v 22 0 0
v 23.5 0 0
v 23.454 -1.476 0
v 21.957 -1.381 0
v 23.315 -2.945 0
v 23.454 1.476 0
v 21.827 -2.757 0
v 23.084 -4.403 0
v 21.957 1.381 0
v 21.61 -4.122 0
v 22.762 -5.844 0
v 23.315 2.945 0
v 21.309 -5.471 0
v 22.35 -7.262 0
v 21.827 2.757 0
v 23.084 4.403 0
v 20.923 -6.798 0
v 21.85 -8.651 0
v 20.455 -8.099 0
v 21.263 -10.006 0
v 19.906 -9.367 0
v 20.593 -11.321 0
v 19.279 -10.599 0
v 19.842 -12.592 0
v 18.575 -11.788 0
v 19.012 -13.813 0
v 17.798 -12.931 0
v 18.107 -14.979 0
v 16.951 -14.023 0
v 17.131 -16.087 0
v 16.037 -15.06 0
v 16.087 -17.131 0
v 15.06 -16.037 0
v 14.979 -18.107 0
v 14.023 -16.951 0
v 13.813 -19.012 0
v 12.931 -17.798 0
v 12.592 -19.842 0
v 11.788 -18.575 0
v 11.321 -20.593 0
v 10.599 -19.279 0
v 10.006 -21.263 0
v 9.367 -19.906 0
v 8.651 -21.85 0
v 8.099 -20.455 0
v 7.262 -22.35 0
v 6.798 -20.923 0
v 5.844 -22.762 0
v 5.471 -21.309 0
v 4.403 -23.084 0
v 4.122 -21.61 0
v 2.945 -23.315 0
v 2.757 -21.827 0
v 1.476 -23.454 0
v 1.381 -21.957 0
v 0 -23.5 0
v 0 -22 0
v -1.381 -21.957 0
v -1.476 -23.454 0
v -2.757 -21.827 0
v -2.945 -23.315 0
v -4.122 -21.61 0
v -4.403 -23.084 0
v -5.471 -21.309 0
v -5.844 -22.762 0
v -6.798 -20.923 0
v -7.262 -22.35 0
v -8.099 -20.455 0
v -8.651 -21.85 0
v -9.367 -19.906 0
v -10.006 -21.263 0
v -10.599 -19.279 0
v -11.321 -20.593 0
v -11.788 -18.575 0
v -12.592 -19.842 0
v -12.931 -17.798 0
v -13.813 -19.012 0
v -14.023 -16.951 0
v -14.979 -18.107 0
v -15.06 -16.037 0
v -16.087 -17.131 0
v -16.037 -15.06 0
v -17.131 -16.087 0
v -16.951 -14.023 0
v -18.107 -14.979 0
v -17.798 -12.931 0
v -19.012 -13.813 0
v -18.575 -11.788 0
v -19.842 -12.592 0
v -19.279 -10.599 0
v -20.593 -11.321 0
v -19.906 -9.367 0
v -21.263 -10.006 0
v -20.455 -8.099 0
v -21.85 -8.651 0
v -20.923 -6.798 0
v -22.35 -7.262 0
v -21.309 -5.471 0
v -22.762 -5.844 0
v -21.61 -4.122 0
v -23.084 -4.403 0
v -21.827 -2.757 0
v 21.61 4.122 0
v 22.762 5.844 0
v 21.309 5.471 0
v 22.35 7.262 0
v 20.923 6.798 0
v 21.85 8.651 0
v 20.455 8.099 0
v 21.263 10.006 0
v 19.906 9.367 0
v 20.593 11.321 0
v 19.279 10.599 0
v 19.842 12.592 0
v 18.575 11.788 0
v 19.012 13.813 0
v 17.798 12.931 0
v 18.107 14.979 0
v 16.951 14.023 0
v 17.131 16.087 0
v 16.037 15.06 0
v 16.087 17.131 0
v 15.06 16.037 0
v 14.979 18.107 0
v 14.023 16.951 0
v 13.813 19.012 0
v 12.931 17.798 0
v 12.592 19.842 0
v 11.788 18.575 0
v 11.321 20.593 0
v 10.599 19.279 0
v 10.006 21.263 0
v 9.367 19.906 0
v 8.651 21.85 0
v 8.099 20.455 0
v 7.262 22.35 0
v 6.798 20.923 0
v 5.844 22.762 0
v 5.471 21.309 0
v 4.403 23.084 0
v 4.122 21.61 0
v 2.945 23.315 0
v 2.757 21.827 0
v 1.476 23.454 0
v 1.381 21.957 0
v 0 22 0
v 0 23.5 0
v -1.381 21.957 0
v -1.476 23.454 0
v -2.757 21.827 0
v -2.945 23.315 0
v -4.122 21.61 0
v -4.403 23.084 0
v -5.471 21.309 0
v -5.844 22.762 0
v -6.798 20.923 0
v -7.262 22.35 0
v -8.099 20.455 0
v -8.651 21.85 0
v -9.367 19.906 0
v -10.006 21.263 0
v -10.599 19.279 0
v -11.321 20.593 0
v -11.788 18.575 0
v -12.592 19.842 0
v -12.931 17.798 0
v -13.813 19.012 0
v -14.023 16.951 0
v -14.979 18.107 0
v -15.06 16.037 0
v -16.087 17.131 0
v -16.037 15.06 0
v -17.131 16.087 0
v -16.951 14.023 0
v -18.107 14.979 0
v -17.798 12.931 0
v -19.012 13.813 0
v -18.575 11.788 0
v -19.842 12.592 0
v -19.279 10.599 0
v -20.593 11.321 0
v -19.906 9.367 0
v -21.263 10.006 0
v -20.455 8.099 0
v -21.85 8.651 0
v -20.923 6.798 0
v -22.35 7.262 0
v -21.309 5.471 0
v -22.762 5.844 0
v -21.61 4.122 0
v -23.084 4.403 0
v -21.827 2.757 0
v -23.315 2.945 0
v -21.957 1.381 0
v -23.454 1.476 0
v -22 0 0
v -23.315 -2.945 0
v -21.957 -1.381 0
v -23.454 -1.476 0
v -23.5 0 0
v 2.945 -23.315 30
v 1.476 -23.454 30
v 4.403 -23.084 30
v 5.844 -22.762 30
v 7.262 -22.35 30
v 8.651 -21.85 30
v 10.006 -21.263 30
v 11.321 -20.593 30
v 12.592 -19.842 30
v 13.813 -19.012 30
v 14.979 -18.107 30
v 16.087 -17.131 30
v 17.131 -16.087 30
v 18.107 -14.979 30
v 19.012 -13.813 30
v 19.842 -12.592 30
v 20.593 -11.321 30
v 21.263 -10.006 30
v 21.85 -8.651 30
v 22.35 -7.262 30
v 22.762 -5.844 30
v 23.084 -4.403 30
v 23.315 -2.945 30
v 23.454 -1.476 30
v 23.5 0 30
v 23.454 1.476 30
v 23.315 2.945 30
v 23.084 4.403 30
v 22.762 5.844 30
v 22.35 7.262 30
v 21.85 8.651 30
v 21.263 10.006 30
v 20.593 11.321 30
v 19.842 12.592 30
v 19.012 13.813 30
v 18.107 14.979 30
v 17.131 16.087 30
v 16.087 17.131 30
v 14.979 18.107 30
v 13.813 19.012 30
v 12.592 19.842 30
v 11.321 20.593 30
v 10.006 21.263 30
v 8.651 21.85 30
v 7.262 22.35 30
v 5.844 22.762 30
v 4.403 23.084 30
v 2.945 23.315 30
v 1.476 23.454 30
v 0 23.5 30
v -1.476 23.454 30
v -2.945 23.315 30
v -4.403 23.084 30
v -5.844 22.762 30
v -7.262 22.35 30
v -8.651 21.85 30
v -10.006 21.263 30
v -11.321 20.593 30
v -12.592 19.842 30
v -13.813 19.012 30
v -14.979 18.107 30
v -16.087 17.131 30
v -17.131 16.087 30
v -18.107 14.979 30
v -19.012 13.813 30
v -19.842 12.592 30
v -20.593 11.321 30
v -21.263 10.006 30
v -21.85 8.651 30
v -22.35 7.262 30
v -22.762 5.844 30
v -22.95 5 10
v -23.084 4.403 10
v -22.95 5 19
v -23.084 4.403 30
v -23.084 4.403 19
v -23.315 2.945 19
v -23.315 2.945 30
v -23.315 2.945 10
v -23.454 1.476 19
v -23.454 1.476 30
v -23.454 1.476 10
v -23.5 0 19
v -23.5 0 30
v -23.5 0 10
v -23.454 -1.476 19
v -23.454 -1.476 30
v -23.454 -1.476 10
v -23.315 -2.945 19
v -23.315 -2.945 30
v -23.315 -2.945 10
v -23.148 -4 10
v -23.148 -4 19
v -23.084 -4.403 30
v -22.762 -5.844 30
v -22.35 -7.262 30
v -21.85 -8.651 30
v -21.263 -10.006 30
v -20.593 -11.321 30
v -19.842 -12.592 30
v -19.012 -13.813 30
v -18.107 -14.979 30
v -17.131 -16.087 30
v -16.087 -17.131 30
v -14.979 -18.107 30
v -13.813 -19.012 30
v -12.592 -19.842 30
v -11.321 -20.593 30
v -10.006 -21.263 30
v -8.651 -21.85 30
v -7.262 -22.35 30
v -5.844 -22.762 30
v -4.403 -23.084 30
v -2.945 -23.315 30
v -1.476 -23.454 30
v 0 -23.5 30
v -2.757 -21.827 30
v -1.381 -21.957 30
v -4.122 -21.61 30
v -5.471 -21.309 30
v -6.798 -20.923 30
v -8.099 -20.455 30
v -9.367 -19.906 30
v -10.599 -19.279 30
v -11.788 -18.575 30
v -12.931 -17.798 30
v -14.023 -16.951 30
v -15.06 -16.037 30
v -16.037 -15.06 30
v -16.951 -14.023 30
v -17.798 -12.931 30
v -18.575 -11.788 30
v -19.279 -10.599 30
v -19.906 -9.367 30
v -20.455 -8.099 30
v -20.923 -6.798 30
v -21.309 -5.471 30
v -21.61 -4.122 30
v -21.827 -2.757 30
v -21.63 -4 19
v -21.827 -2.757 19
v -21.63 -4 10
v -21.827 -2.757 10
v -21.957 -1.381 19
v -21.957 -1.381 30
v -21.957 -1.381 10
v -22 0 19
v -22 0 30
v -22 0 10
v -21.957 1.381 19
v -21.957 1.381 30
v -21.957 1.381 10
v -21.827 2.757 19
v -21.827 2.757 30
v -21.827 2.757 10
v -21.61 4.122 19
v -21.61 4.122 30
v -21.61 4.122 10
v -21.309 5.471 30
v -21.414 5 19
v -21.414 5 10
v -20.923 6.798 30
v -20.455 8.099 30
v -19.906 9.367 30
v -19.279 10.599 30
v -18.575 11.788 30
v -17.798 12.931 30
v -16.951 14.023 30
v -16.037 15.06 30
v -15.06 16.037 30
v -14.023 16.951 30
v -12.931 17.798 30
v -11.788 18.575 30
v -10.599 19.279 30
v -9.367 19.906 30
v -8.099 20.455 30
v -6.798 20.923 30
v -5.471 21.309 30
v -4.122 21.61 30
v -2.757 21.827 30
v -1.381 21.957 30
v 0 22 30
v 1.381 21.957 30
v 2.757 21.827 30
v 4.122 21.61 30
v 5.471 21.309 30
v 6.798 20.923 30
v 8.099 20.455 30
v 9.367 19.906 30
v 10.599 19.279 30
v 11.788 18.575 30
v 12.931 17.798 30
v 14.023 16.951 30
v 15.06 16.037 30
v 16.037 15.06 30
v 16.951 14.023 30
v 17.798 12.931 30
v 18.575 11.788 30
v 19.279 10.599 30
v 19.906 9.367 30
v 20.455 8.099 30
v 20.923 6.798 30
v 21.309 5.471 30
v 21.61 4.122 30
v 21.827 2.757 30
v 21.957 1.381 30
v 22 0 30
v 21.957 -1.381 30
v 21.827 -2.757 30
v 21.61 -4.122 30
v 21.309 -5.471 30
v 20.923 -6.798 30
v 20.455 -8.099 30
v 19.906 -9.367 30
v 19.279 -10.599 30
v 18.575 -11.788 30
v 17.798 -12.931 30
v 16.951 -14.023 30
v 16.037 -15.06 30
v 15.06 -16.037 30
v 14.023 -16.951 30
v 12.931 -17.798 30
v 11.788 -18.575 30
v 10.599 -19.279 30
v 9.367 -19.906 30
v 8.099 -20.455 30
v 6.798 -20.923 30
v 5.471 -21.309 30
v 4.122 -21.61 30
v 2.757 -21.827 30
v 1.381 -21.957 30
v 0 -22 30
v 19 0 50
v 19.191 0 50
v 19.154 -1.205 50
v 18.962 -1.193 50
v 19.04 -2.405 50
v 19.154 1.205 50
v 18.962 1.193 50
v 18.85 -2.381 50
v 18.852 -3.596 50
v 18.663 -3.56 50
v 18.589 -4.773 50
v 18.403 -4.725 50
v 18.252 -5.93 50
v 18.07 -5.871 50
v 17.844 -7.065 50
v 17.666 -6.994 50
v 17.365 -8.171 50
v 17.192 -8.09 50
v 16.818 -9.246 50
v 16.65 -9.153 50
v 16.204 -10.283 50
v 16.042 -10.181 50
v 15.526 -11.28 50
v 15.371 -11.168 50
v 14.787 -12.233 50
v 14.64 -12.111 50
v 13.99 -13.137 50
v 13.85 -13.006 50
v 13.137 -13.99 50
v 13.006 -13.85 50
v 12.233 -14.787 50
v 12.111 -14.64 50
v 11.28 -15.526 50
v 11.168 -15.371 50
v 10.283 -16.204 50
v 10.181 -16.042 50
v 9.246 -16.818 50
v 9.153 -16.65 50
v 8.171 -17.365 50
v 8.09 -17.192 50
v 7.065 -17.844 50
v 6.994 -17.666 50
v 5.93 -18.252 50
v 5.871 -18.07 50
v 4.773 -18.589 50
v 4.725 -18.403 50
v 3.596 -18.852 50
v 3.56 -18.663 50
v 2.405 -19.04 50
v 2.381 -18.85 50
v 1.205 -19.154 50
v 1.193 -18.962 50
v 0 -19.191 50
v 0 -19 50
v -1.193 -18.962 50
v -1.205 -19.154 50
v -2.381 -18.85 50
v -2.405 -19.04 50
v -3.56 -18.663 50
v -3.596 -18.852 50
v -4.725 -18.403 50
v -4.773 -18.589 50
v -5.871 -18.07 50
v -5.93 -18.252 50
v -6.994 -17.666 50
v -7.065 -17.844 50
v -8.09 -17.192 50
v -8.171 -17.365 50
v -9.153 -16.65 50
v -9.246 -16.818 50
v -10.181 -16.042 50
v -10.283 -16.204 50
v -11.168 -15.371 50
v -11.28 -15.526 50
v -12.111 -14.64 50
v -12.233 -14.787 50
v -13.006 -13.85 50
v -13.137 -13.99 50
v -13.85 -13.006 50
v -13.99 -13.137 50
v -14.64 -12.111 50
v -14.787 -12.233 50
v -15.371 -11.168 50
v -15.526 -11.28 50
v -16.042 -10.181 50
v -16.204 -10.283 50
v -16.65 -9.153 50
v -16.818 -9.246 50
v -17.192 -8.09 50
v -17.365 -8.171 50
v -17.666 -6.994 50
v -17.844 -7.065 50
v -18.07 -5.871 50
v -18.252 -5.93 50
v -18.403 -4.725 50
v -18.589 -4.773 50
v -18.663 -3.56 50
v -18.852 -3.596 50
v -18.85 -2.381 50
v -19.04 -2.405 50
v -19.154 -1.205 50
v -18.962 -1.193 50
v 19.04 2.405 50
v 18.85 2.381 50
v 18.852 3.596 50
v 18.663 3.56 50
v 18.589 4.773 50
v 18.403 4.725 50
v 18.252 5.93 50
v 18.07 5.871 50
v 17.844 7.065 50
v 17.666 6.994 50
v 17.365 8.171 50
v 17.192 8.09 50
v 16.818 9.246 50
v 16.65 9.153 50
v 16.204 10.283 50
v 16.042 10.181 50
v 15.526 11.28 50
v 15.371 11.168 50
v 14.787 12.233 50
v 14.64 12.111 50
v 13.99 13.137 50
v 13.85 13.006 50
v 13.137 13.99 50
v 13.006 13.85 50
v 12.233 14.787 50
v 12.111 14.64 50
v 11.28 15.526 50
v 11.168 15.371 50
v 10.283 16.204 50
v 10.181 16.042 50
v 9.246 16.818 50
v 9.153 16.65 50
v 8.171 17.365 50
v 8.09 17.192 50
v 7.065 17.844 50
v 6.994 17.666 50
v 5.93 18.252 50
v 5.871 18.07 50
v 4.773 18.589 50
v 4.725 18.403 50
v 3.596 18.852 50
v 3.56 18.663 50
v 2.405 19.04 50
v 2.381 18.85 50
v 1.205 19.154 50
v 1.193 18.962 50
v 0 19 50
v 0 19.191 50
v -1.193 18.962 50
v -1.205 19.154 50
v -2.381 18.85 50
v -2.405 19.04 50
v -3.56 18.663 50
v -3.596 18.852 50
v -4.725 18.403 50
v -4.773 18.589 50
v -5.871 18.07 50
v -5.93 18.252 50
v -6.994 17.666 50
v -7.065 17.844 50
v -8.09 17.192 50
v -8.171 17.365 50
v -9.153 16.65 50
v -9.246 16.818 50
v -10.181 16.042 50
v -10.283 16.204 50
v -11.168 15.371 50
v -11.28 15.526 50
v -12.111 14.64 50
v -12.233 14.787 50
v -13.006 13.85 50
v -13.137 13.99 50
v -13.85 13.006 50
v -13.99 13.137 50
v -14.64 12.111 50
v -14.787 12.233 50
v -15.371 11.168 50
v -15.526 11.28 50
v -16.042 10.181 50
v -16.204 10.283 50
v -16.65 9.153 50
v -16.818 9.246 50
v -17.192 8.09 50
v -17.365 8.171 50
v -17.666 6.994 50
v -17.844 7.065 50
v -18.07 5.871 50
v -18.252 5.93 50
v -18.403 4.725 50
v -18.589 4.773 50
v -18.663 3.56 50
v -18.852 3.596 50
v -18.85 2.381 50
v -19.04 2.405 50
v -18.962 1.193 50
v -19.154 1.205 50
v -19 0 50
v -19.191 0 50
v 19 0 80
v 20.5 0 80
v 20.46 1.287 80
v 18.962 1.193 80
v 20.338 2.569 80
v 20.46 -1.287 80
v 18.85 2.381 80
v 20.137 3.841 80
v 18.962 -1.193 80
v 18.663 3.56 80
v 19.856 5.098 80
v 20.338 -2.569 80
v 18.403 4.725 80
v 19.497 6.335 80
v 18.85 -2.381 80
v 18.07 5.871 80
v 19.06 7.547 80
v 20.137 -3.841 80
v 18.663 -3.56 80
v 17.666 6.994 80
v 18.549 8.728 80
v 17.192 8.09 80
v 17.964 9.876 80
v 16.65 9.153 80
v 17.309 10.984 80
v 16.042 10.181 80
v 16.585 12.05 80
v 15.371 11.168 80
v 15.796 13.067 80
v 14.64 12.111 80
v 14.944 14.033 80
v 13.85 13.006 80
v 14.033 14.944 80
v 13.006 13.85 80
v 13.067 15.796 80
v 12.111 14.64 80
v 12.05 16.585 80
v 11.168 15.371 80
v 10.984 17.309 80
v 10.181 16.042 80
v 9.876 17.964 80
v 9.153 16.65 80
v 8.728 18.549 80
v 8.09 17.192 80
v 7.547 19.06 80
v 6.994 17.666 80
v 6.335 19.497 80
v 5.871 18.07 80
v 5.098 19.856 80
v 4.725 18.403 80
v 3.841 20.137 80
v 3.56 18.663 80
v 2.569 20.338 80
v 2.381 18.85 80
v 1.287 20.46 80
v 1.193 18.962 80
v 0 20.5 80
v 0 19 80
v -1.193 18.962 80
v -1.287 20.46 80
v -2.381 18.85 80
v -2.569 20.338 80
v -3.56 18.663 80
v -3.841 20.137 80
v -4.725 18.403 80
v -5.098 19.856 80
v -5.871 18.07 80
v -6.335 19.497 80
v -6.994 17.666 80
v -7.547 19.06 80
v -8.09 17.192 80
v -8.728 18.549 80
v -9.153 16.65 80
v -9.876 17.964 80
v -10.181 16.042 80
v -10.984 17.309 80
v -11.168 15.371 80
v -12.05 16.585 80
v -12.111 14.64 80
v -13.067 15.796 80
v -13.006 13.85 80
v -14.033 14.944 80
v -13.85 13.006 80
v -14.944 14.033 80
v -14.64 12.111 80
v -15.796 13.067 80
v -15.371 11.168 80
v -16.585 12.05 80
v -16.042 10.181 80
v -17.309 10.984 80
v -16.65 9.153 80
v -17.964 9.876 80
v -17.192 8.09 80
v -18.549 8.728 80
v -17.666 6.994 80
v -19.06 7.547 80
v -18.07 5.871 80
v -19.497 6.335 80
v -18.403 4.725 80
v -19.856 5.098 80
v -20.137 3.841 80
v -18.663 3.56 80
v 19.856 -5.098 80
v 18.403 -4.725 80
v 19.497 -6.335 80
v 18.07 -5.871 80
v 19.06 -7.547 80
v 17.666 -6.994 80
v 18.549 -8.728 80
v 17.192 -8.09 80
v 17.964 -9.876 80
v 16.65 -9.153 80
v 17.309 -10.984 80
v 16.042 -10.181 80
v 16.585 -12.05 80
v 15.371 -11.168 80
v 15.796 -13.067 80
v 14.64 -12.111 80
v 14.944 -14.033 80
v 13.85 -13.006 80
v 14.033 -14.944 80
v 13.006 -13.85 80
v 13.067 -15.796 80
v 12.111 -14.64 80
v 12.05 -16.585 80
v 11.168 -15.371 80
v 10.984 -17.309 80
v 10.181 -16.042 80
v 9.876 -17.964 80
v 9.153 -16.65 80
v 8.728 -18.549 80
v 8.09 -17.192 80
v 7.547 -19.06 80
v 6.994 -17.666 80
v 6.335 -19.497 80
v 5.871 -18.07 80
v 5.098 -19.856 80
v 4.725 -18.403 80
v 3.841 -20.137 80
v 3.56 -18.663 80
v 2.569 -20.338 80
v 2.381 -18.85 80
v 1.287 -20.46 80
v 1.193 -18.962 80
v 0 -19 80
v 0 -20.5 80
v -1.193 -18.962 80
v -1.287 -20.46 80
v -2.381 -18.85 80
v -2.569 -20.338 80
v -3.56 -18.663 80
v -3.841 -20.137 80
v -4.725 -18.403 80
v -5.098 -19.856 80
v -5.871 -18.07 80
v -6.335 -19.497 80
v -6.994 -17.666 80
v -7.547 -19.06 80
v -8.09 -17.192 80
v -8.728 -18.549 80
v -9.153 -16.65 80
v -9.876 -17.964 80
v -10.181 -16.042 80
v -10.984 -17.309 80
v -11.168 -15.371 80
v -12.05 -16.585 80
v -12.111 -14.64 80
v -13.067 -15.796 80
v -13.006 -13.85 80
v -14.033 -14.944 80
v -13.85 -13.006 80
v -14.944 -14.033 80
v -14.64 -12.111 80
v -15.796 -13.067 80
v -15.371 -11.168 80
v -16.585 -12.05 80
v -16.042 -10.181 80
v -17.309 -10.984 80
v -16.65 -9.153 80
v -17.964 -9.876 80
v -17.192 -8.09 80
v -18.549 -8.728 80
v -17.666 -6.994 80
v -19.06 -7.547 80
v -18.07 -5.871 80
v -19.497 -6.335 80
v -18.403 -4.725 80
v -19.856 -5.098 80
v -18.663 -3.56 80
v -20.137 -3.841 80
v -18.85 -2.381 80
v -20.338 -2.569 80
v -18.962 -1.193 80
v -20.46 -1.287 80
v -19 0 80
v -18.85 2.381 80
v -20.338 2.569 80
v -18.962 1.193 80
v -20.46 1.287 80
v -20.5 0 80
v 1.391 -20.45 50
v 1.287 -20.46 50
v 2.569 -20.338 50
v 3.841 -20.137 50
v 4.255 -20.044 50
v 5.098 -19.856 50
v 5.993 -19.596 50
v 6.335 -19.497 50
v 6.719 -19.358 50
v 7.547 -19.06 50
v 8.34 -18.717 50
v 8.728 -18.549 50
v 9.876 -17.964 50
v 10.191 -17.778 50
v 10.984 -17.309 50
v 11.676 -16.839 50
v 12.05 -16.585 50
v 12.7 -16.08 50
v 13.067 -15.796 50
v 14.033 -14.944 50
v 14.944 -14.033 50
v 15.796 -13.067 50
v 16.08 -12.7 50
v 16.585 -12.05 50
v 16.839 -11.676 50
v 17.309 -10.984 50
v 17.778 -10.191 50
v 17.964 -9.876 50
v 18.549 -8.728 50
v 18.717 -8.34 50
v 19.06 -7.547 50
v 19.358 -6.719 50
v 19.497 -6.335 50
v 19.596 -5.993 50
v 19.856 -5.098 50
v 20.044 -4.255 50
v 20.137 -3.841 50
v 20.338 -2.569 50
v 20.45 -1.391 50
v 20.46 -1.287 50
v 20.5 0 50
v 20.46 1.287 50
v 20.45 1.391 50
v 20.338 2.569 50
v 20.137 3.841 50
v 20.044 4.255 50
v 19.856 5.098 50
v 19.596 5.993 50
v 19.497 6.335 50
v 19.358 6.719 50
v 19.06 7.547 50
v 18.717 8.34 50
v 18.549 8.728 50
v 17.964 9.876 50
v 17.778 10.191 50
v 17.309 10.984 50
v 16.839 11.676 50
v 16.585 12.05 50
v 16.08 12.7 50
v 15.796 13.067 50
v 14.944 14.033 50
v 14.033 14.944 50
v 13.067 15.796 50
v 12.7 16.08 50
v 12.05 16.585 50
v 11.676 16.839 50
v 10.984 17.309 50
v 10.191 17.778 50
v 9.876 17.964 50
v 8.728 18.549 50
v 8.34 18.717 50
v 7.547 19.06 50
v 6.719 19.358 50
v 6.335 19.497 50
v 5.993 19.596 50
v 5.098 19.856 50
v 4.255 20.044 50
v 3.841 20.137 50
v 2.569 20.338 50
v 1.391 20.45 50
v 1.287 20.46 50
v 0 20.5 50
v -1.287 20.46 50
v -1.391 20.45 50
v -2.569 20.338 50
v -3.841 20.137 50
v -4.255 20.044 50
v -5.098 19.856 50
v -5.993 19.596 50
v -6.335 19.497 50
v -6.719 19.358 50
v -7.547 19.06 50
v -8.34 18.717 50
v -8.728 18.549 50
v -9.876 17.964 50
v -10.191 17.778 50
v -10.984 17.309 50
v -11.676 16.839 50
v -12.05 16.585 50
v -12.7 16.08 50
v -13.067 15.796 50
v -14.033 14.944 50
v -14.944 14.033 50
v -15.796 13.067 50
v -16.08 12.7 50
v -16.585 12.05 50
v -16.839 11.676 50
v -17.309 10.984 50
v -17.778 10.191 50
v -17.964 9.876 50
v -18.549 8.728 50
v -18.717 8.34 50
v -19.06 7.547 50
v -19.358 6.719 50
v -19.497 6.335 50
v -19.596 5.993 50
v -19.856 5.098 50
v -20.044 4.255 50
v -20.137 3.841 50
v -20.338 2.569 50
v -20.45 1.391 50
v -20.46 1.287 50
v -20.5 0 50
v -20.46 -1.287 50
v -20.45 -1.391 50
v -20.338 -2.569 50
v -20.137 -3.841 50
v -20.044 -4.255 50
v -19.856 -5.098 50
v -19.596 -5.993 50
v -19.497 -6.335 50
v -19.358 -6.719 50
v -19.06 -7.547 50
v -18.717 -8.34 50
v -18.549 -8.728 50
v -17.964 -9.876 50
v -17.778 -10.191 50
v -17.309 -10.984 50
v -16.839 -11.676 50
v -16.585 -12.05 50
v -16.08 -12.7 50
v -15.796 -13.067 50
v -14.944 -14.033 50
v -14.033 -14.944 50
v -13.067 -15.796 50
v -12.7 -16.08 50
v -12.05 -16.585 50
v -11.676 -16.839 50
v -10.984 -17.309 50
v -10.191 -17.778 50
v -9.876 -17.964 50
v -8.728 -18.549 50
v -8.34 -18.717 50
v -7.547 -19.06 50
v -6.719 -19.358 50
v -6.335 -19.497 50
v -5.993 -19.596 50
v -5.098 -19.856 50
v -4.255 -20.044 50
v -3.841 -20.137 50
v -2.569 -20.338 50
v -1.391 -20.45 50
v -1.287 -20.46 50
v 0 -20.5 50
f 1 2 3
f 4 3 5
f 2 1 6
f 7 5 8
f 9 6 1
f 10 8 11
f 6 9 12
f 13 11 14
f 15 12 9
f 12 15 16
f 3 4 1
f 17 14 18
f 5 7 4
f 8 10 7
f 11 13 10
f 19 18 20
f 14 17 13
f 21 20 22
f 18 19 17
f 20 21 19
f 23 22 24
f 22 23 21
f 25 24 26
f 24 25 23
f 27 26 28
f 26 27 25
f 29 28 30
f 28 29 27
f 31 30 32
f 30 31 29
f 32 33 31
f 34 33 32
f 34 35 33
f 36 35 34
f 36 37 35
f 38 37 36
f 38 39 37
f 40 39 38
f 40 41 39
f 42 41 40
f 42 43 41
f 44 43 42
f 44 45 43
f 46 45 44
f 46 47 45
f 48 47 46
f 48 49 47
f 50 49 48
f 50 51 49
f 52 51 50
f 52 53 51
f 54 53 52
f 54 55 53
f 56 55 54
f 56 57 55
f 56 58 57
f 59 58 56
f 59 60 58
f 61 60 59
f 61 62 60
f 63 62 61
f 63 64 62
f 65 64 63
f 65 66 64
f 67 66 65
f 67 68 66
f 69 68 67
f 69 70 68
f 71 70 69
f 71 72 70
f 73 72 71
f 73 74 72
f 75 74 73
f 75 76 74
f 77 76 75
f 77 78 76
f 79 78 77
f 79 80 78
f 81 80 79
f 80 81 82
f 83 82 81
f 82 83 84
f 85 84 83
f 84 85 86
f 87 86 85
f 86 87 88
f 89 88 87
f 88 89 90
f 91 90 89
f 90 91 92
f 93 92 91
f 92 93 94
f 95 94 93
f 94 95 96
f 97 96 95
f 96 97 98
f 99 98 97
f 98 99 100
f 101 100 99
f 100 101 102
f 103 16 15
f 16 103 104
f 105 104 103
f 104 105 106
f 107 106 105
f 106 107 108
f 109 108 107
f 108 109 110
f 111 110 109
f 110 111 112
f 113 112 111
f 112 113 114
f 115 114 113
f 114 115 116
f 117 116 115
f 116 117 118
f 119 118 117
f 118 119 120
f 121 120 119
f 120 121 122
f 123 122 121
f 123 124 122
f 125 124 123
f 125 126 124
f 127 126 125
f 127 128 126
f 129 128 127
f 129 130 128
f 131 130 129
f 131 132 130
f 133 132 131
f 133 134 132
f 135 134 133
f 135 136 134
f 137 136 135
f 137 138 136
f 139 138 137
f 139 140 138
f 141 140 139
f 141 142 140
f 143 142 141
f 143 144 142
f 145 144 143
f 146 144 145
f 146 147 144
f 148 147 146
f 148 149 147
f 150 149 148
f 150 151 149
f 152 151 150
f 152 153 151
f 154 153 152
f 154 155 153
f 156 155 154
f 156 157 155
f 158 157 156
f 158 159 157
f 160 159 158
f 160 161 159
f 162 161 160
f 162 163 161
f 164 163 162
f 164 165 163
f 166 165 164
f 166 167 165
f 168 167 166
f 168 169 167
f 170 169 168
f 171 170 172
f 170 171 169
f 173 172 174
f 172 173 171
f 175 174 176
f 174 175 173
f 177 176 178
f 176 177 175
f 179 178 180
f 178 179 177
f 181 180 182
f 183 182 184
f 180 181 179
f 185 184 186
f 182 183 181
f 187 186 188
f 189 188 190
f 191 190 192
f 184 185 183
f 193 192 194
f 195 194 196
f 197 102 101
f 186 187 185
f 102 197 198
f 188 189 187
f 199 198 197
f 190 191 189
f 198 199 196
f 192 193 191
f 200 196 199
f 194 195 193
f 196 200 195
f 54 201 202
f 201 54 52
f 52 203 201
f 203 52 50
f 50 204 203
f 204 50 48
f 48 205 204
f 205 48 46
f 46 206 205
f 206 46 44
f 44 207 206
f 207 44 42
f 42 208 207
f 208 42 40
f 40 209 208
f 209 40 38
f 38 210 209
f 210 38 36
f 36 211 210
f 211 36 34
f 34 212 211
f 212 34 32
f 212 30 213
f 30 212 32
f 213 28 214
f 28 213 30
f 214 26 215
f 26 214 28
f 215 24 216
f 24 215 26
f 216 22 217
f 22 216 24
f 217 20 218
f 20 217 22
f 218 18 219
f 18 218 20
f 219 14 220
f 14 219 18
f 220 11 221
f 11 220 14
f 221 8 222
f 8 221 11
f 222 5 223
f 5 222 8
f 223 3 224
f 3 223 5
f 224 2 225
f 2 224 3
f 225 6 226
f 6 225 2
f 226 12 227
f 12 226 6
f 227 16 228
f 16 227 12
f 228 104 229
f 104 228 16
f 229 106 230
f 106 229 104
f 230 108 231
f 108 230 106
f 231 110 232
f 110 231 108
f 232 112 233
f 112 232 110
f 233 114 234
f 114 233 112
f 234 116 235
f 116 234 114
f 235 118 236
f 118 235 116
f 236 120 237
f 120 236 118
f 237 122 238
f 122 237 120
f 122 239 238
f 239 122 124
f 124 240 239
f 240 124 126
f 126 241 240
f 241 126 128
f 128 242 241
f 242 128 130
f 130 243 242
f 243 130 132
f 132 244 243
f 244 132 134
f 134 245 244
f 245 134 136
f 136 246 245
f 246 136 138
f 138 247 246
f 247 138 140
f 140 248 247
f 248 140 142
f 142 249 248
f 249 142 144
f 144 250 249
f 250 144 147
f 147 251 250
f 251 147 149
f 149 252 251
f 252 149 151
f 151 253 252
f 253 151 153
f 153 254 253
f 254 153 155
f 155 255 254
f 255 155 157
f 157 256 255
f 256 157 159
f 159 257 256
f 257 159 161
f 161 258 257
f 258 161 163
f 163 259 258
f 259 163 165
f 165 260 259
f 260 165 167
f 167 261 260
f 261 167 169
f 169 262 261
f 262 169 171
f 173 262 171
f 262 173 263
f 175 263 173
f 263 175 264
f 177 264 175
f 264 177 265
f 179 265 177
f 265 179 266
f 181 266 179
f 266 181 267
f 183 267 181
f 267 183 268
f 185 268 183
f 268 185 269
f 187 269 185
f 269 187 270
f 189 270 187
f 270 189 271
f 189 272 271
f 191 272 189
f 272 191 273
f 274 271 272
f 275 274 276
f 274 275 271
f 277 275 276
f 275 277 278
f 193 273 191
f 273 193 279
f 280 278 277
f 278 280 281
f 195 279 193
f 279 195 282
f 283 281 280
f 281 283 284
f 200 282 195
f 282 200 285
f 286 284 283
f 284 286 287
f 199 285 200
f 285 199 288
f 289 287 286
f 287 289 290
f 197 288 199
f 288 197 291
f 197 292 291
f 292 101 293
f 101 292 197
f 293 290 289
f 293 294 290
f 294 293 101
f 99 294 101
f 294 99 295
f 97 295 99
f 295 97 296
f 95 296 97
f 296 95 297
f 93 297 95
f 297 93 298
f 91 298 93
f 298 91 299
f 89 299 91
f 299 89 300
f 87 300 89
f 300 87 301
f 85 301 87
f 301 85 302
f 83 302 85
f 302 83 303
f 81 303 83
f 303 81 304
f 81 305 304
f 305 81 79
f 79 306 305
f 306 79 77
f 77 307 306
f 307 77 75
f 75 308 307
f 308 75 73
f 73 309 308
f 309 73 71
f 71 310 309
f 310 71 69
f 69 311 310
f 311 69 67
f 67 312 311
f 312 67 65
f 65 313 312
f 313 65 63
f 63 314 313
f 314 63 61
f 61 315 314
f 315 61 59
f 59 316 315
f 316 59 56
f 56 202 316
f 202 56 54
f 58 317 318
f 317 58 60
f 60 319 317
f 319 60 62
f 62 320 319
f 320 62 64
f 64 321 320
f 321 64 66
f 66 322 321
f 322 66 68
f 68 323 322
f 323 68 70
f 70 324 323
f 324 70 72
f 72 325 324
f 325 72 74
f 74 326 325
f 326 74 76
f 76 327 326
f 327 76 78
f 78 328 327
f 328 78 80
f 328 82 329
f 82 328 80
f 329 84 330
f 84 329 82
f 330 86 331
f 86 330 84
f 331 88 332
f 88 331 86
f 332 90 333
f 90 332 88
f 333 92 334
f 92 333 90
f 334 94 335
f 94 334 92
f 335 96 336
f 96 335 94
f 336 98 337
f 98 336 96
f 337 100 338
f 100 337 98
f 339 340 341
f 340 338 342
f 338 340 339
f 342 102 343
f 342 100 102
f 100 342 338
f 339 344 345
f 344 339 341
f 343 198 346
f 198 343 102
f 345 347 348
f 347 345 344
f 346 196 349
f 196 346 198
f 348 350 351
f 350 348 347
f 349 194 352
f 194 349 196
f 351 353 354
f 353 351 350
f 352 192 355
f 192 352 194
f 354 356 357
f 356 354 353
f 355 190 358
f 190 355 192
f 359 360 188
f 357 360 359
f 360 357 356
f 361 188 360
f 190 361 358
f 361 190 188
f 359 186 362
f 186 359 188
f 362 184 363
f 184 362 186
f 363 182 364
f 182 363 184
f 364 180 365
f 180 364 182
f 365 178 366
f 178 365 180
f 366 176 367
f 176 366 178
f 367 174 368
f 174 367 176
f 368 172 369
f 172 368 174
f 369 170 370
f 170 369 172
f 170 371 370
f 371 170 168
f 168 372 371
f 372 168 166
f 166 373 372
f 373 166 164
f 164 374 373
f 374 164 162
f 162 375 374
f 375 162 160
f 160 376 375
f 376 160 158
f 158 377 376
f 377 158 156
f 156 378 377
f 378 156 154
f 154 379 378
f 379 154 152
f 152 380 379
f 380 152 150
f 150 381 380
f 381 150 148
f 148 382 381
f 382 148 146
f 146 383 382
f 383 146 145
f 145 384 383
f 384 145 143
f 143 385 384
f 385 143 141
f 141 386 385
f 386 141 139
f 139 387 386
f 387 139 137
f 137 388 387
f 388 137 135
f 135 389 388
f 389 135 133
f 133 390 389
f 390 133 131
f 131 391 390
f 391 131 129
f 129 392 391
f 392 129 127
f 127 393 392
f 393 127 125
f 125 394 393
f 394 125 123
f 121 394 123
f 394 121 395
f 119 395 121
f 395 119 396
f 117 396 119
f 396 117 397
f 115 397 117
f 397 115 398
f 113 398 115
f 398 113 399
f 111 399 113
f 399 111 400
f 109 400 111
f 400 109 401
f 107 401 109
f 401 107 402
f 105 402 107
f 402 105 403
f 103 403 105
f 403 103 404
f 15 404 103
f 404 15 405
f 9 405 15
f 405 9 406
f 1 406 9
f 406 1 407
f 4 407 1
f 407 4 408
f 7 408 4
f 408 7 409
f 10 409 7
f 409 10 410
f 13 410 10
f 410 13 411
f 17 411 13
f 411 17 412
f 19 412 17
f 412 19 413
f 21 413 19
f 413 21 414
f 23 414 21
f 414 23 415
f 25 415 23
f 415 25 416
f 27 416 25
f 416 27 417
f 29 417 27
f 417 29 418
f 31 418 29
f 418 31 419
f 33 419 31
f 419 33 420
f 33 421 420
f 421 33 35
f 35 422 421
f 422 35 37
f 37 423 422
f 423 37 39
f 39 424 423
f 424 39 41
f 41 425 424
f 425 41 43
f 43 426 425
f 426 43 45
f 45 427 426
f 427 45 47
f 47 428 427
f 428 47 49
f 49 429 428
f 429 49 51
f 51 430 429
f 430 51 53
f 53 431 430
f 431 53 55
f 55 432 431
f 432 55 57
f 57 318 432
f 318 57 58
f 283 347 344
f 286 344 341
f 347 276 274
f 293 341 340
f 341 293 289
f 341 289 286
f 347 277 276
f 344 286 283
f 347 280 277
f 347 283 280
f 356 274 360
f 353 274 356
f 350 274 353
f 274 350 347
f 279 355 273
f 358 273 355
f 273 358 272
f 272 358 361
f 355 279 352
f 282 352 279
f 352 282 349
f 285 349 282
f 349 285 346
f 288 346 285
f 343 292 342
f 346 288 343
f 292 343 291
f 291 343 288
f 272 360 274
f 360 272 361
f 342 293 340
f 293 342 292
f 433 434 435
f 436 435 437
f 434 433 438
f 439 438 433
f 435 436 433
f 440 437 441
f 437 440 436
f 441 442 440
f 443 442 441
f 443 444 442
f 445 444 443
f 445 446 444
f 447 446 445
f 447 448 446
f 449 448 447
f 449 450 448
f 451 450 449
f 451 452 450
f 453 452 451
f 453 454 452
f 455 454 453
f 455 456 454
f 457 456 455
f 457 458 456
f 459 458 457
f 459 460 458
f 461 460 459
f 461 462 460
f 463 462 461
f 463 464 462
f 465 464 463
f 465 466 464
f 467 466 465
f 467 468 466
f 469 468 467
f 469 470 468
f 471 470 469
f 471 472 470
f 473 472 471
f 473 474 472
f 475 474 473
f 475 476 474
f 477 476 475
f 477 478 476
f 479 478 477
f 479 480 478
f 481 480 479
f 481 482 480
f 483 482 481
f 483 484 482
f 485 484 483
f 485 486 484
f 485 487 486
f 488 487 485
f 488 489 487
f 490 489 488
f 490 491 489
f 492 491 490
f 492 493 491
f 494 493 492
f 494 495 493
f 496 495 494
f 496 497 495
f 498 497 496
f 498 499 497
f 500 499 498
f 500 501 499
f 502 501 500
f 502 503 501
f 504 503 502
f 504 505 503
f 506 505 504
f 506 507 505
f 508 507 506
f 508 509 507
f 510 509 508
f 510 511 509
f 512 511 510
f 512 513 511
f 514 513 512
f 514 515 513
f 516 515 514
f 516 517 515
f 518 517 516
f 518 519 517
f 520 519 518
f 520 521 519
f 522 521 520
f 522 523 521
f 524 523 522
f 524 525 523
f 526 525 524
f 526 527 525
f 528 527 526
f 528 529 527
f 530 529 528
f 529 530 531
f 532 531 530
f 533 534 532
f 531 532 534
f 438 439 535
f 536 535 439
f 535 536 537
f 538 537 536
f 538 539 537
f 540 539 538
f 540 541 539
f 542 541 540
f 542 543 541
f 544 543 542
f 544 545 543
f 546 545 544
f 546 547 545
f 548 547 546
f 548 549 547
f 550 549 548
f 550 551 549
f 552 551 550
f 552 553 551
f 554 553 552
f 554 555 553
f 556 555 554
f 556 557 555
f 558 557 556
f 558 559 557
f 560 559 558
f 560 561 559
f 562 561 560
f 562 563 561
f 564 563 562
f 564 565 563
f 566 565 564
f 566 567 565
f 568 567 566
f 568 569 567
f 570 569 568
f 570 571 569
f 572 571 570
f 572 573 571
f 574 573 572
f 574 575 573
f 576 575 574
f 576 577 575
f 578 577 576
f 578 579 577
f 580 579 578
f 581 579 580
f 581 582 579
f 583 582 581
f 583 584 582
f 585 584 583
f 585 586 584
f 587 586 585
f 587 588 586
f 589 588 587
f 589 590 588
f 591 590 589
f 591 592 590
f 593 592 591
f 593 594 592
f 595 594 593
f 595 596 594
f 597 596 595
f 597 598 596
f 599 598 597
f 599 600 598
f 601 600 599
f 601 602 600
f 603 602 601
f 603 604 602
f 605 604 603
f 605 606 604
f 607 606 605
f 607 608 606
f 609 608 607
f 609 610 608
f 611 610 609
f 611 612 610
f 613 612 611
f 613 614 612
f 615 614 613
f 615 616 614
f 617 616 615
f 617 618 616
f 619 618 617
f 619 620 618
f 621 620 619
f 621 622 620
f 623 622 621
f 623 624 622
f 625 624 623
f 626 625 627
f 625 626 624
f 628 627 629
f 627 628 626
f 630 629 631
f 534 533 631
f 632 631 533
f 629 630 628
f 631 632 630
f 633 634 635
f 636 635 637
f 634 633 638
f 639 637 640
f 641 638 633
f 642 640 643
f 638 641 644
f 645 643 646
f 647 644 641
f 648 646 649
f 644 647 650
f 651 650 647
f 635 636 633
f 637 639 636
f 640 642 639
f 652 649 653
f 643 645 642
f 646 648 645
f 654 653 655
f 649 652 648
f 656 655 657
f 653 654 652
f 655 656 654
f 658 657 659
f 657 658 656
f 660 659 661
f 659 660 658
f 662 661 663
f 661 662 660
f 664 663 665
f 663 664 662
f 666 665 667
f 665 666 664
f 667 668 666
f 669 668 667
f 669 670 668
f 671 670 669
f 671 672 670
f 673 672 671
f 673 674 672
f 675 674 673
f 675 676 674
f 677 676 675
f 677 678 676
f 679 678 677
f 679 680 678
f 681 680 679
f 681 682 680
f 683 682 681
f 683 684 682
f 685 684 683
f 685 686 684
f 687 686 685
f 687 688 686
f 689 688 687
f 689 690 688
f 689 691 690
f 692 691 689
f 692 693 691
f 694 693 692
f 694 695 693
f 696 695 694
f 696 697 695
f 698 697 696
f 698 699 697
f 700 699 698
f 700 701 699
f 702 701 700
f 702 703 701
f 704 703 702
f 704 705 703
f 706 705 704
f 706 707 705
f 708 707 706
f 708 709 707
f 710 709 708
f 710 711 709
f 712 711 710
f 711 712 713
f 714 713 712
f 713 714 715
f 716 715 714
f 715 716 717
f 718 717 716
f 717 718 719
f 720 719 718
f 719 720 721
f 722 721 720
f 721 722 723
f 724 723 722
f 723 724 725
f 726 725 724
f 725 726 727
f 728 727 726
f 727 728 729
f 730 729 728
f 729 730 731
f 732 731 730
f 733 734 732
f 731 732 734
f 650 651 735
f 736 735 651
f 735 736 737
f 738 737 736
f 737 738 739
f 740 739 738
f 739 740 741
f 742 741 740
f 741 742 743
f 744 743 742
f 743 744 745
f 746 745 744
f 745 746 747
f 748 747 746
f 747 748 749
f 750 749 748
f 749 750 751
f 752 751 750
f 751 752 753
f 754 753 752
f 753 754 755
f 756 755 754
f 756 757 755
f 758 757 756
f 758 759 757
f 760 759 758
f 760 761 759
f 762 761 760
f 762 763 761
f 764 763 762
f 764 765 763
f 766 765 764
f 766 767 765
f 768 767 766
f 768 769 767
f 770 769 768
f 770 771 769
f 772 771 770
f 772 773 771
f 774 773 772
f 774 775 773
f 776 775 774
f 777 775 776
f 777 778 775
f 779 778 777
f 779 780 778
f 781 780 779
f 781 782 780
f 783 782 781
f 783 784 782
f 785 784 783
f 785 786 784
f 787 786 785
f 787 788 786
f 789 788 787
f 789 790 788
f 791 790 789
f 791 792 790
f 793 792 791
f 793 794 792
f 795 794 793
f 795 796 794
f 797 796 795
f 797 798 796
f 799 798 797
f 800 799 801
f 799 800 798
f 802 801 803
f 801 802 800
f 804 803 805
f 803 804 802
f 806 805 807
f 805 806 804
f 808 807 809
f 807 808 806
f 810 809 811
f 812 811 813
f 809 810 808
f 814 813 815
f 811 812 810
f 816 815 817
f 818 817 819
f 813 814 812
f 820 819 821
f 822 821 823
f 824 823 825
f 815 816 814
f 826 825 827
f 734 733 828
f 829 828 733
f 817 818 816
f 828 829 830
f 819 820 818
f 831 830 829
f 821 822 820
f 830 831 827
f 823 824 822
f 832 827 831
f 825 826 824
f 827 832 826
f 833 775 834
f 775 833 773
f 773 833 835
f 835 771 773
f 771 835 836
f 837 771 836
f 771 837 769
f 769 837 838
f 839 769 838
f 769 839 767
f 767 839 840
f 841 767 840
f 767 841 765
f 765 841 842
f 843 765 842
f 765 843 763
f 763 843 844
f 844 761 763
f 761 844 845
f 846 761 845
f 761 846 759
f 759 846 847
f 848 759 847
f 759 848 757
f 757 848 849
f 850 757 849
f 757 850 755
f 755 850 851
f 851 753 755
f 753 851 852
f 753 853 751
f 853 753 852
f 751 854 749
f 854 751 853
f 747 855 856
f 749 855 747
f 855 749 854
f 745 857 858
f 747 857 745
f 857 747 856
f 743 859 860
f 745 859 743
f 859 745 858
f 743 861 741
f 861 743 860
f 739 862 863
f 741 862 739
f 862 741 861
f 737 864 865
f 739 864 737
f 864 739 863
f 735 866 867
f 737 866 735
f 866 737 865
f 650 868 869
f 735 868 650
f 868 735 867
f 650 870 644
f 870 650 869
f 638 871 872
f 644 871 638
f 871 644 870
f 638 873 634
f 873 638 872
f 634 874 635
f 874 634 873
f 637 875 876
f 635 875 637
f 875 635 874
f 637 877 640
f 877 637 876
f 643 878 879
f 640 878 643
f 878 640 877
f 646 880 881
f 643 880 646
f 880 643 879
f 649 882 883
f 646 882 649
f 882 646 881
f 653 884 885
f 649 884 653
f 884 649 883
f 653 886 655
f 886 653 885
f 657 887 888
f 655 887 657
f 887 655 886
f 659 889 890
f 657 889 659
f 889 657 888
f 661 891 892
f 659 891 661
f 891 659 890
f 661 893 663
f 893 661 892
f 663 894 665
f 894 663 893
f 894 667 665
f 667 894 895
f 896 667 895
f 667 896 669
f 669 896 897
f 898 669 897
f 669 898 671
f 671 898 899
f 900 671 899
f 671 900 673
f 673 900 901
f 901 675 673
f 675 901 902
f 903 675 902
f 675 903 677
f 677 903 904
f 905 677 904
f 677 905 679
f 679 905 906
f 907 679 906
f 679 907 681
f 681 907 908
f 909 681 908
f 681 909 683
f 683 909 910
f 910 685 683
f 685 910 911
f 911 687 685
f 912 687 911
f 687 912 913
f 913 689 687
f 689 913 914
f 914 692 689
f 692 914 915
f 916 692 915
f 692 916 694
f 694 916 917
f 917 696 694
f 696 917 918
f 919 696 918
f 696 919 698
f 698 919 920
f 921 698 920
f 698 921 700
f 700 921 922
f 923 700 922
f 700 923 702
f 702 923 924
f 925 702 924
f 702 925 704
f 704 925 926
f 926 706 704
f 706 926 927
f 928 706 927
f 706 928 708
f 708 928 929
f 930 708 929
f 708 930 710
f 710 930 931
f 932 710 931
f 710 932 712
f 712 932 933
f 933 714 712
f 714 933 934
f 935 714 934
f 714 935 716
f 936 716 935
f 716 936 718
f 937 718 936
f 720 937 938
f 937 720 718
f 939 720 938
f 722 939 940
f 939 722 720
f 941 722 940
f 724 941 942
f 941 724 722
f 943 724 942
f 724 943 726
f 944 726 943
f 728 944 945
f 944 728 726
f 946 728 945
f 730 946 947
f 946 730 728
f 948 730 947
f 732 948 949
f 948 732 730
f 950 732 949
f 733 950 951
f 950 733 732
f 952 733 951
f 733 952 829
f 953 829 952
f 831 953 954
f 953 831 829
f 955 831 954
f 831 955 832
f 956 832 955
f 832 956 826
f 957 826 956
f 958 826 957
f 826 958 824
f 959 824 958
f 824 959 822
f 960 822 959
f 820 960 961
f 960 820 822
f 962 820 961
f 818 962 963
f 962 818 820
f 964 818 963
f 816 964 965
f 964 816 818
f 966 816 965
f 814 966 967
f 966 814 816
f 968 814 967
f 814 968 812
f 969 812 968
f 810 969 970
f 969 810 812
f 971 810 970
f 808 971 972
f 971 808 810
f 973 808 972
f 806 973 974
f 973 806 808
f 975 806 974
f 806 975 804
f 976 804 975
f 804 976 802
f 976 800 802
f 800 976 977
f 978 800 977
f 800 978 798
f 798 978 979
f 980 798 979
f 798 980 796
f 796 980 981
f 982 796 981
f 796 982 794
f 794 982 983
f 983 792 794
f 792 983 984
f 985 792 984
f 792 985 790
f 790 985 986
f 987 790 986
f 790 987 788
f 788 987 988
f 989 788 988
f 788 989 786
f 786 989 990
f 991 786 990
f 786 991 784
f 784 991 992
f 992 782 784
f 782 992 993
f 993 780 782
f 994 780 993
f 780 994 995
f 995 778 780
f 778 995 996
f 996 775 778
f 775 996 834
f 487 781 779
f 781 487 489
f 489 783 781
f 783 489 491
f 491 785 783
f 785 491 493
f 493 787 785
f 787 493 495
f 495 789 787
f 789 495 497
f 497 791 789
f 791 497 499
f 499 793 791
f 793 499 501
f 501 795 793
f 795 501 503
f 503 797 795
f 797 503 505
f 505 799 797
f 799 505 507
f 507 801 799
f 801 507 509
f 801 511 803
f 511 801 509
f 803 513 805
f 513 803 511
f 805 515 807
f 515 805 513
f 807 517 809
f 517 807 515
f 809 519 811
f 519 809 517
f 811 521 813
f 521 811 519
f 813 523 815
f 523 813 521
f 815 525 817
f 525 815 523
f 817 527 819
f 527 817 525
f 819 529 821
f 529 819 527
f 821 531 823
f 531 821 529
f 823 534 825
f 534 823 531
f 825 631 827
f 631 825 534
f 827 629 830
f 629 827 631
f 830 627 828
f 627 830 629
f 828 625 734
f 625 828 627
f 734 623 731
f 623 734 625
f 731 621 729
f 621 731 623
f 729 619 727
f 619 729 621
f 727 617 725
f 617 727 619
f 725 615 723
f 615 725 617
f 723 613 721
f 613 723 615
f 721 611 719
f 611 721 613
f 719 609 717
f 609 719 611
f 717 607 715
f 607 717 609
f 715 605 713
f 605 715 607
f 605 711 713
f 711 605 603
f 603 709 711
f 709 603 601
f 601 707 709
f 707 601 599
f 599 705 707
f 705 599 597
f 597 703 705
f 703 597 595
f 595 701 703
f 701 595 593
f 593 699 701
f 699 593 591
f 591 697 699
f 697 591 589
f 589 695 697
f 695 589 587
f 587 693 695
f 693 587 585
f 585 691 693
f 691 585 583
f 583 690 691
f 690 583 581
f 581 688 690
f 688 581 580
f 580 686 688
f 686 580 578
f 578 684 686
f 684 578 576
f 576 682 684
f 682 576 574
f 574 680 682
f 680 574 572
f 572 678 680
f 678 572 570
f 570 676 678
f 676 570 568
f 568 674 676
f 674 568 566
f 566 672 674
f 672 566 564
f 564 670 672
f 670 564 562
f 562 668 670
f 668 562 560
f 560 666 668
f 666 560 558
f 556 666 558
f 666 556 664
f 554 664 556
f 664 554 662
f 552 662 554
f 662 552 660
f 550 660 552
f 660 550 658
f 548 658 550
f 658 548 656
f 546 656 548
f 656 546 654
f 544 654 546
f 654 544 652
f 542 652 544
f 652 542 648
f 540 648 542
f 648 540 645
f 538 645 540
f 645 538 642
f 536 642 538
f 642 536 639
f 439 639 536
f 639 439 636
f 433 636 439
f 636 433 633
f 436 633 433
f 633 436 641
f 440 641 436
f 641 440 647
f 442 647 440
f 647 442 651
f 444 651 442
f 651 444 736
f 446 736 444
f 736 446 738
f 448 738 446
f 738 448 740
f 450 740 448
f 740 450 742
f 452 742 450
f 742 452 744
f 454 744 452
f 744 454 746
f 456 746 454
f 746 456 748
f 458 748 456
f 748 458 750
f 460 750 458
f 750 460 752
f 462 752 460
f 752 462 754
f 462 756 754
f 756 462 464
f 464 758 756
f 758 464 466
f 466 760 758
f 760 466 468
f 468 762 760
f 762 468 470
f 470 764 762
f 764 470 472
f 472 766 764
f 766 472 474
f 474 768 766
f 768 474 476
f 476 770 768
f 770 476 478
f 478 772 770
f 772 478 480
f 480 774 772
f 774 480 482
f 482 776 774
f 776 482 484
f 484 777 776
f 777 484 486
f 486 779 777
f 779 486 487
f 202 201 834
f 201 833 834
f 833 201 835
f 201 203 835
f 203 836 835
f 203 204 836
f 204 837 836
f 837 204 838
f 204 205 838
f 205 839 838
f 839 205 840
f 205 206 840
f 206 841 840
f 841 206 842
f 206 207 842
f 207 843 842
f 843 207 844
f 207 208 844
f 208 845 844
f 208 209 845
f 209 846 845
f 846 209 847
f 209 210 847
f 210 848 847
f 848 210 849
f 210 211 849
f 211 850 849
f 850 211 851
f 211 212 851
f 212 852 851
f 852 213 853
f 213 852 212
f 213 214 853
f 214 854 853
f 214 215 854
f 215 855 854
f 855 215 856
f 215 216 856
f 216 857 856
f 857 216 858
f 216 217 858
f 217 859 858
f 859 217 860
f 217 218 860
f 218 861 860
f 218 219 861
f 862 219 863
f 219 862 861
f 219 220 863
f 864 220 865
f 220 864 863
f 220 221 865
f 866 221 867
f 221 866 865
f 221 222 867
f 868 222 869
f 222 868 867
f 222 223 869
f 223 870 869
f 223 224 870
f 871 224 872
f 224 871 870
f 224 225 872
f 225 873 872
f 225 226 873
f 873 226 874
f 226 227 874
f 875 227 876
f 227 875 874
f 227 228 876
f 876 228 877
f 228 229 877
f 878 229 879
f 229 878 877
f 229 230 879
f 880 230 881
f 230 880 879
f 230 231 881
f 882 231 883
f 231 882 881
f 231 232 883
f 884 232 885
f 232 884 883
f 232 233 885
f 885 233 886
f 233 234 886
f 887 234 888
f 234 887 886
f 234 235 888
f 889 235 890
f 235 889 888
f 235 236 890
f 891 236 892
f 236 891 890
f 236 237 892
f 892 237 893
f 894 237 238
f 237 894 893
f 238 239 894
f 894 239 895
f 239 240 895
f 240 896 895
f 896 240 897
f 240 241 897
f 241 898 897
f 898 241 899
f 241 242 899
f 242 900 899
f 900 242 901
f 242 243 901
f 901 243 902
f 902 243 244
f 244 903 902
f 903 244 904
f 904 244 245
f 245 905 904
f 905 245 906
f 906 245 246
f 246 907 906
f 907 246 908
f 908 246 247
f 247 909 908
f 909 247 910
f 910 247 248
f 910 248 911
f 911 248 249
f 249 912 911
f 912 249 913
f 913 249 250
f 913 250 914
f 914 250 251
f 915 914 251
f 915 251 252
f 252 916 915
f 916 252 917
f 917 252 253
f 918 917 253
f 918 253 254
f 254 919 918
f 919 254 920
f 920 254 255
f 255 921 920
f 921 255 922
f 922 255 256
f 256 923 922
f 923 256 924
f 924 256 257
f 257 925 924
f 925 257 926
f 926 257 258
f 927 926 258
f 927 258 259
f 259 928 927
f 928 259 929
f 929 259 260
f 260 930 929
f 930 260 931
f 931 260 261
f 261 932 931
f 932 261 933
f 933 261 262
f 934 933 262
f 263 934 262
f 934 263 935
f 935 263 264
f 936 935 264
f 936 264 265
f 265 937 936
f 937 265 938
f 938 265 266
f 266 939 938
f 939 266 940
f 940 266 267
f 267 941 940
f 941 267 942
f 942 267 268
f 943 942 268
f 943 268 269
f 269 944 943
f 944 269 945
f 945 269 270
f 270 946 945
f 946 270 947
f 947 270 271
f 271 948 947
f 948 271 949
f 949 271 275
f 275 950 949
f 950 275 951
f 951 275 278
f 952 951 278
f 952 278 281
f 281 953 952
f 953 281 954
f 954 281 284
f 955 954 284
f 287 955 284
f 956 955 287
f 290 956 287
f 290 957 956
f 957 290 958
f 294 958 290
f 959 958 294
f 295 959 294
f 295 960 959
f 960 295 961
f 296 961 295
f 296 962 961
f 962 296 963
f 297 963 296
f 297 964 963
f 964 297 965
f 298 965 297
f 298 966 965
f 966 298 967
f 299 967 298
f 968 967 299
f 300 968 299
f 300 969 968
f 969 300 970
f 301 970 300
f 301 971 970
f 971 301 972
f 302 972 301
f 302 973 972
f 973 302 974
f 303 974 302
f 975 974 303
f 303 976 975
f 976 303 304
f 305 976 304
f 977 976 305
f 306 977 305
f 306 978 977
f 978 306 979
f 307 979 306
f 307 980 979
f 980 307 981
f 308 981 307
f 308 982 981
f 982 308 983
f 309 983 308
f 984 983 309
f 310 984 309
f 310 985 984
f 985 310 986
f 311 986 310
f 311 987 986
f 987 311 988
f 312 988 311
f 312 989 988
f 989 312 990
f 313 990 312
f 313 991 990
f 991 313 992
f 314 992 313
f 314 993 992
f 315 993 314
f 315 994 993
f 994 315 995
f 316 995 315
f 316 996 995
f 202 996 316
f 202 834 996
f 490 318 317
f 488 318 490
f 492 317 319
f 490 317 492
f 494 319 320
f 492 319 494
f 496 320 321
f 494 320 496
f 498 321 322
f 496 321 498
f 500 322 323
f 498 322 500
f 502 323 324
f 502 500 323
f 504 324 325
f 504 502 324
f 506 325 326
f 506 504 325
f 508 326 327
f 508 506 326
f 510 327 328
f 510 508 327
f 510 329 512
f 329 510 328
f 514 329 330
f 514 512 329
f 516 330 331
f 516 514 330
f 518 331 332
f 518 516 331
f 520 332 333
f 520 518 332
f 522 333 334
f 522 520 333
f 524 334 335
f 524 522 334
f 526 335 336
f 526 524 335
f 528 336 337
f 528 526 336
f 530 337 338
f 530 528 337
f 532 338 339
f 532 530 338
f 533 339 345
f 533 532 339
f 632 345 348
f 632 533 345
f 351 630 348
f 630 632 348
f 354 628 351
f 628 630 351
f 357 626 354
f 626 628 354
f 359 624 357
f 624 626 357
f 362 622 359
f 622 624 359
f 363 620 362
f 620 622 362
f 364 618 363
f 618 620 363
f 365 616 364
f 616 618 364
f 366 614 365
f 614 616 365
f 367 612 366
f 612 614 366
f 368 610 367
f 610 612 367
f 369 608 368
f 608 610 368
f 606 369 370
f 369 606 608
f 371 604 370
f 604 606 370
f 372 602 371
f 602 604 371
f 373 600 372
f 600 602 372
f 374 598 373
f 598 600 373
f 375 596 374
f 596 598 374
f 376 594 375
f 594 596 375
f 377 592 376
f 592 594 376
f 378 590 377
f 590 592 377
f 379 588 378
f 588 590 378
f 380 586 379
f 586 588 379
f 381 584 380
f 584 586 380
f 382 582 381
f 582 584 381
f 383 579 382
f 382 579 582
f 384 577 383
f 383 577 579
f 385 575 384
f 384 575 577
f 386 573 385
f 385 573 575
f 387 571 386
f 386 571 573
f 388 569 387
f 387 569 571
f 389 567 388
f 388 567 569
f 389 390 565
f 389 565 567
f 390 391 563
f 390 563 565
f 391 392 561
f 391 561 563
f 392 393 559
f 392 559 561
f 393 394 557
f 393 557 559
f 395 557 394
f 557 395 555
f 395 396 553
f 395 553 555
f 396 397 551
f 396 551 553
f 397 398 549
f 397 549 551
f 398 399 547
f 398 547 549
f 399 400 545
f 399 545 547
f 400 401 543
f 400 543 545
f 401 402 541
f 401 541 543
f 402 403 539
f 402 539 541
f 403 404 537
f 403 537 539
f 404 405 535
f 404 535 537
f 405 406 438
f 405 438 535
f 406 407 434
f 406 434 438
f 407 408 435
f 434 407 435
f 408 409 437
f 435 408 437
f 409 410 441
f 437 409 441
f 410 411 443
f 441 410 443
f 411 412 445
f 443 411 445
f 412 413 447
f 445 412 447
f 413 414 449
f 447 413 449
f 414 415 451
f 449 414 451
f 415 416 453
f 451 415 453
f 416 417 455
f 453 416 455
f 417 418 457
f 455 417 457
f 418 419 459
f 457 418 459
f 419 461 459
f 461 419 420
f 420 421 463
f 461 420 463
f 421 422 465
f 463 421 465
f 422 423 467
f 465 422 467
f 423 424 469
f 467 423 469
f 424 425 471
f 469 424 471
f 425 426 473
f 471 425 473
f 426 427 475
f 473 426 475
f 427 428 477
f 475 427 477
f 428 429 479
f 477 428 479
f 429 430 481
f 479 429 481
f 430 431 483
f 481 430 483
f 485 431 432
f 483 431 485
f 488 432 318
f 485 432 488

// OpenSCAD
WALL_THICKNESS = 3;
MIDDLE_Z_LENGTH = 20;


// Vacuum side
ID_VAC=44;
UD_VAC=ID_VAC + WALL_THICKNESS;
VACUUM_Z_MAX=30;

difference() {
translate([0,0,0]) {
    linear_extrude(height=VACUUM_Z_MAX) {
        difference() {
            circle(d=UD_VAC, $fn=100);
            circle(d=ID_VAC, $fn=100);
        }
    }
}
// plug thingies
translate([-ID_SANDER, -4, 10])
                   cube([55,9,9]);
}


// Sander side
//ID_SANDER = 28; //Sander
ID_SANDER = 38;

UD_SANDER = ID_SANDER + WALL_THICKNESS;
SANDER_Z_MAX = 30;
   
translate([0,0,MIDDLE_Z_LENGTH + VACUUM_Z_MAX]) 
    linear_extrude(height=SANDER_Z_MAX){
    difference() {
        circle(d=UD_SANDER, $fn=100);      
        circle(d=ID_SANDER, $fn=100);
        }
    }          
    

// middle part
SLOPE_SCALE=UD_SANDER/UD_VAC;
translate([0,0,VACUUM_Z_MAX])
linear_extrude(height=MIDDLE_Z_LENGTH, scale = SLOPE_SCALE) {
    difference() {
            circle(d=UD_VAC, $fn=100);
            circle(d=ID_VAC, $fn=100);
        }

}
